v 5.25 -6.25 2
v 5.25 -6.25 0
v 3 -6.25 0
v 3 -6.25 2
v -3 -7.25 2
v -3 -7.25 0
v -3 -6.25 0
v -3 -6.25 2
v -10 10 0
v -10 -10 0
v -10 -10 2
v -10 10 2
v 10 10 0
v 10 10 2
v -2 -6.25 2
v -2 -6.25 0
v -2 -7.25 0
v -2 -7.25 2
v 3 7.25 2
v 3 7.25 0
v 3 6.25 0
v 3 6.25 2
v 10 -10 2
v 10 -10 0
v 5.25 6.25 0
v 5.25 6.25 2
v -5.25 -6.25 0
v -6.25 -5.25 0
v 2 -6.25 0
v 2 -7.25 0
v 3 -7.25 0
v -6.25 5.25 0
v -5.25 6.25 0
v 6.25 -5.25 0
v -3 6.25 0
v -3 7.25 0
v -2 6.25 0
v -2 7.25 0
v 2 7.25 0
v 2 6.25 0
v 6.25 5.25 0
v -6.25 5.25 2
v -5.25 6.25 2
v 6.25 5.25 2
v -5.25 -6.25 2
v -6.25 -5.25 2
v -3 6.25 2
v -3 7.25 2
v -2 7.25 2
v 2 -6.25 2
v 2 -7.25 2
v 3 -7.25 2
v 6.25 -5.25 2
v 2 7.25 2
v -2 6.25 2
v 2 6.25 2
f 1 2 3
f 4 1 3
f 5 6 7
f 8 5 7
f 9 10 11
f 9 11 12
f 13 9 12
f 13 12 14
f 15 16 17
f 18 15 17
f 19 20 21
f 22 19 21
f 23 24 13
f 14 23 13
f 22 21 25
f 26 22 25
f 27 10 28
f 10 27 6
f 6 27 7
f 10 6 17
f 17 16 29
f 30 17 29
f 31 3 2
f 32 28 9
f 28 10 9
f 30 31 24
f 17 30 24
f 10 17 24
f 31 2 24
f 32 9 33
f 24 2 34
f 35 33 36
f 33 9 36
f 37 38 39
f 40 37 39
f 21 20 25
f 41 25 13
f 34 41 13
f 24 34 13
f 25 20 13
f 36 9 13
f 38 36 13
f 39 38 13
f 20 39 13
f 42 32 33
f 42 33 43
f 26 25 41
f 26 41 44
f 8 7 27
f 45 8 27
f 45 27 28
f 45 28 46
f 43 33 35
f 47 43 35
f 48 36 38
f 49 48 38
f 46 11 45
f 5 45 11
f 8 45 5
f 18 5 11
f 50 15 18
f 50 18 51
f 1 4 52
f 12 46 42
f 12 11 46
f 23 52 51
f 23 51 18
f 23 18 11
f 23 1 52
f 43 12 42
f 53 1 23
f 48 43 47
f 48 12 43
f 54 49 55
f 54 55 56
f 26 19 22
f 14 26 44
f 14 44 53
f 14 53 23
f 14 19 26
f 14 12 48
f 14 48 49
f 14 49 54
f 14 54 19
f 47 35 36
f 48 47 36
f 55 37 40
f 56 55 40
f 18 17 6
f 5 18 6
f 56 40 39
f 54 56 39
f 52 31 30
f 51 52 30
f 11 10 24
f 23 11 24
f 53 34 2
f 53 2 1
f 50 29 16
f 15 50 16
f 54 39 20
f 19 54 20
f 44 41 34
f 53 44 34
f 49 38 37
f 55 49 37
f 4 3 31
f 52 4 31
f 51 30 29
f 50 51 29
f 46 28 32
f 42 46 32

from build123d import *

# Parameters (mm, degrees)
SKETCH_2_W      = 20
SKETCH_2_H      = 20
EXTRUDE_1_DEPTH = 2
CHAMFER_1_SIZE  = 1


with BuildPart() as part:
    # 스케치2 → 보스-돌출1 (new body)
    with BuildSketch(Plane.XY):
        Rectangle(SKETCH_2_W, SKETCH_2_H)
        Polygon((-3, -6.25), (-6.25, -6.25), (-6.25, 6.25), (-3, 6.25), (-3, 7.25), (-2, 7.25), (-2, 6.25), (2, 6.25), (2, 7.25), (3, 7.25), (3, 6.25), (6.25, 6.25), (6.25, -6.25), (3, -6.25), (3, -7.25), (2, -7.25), (2, -6.25), (-2, -6.25), (-2, -7.25), (-3, -7.25), align=None, mode=Mode.SUBTRACT)
    extrude(amount=EXTRUDE_1_DEPTH)

    # 모따기1
    chamfer_1_edges = [part.edges().sort_by_distance(p)[0] for p in [
        (6.25, -6.25, 1),
        (6.25, 6.25, 1),
        (-6.25, 6.25, 1),
        (-6.25, -6.25, 1),
    ]]
    chamfer(chamfer_1_edges, length=CHAMFER_1_SIZE)


solid = part.part
